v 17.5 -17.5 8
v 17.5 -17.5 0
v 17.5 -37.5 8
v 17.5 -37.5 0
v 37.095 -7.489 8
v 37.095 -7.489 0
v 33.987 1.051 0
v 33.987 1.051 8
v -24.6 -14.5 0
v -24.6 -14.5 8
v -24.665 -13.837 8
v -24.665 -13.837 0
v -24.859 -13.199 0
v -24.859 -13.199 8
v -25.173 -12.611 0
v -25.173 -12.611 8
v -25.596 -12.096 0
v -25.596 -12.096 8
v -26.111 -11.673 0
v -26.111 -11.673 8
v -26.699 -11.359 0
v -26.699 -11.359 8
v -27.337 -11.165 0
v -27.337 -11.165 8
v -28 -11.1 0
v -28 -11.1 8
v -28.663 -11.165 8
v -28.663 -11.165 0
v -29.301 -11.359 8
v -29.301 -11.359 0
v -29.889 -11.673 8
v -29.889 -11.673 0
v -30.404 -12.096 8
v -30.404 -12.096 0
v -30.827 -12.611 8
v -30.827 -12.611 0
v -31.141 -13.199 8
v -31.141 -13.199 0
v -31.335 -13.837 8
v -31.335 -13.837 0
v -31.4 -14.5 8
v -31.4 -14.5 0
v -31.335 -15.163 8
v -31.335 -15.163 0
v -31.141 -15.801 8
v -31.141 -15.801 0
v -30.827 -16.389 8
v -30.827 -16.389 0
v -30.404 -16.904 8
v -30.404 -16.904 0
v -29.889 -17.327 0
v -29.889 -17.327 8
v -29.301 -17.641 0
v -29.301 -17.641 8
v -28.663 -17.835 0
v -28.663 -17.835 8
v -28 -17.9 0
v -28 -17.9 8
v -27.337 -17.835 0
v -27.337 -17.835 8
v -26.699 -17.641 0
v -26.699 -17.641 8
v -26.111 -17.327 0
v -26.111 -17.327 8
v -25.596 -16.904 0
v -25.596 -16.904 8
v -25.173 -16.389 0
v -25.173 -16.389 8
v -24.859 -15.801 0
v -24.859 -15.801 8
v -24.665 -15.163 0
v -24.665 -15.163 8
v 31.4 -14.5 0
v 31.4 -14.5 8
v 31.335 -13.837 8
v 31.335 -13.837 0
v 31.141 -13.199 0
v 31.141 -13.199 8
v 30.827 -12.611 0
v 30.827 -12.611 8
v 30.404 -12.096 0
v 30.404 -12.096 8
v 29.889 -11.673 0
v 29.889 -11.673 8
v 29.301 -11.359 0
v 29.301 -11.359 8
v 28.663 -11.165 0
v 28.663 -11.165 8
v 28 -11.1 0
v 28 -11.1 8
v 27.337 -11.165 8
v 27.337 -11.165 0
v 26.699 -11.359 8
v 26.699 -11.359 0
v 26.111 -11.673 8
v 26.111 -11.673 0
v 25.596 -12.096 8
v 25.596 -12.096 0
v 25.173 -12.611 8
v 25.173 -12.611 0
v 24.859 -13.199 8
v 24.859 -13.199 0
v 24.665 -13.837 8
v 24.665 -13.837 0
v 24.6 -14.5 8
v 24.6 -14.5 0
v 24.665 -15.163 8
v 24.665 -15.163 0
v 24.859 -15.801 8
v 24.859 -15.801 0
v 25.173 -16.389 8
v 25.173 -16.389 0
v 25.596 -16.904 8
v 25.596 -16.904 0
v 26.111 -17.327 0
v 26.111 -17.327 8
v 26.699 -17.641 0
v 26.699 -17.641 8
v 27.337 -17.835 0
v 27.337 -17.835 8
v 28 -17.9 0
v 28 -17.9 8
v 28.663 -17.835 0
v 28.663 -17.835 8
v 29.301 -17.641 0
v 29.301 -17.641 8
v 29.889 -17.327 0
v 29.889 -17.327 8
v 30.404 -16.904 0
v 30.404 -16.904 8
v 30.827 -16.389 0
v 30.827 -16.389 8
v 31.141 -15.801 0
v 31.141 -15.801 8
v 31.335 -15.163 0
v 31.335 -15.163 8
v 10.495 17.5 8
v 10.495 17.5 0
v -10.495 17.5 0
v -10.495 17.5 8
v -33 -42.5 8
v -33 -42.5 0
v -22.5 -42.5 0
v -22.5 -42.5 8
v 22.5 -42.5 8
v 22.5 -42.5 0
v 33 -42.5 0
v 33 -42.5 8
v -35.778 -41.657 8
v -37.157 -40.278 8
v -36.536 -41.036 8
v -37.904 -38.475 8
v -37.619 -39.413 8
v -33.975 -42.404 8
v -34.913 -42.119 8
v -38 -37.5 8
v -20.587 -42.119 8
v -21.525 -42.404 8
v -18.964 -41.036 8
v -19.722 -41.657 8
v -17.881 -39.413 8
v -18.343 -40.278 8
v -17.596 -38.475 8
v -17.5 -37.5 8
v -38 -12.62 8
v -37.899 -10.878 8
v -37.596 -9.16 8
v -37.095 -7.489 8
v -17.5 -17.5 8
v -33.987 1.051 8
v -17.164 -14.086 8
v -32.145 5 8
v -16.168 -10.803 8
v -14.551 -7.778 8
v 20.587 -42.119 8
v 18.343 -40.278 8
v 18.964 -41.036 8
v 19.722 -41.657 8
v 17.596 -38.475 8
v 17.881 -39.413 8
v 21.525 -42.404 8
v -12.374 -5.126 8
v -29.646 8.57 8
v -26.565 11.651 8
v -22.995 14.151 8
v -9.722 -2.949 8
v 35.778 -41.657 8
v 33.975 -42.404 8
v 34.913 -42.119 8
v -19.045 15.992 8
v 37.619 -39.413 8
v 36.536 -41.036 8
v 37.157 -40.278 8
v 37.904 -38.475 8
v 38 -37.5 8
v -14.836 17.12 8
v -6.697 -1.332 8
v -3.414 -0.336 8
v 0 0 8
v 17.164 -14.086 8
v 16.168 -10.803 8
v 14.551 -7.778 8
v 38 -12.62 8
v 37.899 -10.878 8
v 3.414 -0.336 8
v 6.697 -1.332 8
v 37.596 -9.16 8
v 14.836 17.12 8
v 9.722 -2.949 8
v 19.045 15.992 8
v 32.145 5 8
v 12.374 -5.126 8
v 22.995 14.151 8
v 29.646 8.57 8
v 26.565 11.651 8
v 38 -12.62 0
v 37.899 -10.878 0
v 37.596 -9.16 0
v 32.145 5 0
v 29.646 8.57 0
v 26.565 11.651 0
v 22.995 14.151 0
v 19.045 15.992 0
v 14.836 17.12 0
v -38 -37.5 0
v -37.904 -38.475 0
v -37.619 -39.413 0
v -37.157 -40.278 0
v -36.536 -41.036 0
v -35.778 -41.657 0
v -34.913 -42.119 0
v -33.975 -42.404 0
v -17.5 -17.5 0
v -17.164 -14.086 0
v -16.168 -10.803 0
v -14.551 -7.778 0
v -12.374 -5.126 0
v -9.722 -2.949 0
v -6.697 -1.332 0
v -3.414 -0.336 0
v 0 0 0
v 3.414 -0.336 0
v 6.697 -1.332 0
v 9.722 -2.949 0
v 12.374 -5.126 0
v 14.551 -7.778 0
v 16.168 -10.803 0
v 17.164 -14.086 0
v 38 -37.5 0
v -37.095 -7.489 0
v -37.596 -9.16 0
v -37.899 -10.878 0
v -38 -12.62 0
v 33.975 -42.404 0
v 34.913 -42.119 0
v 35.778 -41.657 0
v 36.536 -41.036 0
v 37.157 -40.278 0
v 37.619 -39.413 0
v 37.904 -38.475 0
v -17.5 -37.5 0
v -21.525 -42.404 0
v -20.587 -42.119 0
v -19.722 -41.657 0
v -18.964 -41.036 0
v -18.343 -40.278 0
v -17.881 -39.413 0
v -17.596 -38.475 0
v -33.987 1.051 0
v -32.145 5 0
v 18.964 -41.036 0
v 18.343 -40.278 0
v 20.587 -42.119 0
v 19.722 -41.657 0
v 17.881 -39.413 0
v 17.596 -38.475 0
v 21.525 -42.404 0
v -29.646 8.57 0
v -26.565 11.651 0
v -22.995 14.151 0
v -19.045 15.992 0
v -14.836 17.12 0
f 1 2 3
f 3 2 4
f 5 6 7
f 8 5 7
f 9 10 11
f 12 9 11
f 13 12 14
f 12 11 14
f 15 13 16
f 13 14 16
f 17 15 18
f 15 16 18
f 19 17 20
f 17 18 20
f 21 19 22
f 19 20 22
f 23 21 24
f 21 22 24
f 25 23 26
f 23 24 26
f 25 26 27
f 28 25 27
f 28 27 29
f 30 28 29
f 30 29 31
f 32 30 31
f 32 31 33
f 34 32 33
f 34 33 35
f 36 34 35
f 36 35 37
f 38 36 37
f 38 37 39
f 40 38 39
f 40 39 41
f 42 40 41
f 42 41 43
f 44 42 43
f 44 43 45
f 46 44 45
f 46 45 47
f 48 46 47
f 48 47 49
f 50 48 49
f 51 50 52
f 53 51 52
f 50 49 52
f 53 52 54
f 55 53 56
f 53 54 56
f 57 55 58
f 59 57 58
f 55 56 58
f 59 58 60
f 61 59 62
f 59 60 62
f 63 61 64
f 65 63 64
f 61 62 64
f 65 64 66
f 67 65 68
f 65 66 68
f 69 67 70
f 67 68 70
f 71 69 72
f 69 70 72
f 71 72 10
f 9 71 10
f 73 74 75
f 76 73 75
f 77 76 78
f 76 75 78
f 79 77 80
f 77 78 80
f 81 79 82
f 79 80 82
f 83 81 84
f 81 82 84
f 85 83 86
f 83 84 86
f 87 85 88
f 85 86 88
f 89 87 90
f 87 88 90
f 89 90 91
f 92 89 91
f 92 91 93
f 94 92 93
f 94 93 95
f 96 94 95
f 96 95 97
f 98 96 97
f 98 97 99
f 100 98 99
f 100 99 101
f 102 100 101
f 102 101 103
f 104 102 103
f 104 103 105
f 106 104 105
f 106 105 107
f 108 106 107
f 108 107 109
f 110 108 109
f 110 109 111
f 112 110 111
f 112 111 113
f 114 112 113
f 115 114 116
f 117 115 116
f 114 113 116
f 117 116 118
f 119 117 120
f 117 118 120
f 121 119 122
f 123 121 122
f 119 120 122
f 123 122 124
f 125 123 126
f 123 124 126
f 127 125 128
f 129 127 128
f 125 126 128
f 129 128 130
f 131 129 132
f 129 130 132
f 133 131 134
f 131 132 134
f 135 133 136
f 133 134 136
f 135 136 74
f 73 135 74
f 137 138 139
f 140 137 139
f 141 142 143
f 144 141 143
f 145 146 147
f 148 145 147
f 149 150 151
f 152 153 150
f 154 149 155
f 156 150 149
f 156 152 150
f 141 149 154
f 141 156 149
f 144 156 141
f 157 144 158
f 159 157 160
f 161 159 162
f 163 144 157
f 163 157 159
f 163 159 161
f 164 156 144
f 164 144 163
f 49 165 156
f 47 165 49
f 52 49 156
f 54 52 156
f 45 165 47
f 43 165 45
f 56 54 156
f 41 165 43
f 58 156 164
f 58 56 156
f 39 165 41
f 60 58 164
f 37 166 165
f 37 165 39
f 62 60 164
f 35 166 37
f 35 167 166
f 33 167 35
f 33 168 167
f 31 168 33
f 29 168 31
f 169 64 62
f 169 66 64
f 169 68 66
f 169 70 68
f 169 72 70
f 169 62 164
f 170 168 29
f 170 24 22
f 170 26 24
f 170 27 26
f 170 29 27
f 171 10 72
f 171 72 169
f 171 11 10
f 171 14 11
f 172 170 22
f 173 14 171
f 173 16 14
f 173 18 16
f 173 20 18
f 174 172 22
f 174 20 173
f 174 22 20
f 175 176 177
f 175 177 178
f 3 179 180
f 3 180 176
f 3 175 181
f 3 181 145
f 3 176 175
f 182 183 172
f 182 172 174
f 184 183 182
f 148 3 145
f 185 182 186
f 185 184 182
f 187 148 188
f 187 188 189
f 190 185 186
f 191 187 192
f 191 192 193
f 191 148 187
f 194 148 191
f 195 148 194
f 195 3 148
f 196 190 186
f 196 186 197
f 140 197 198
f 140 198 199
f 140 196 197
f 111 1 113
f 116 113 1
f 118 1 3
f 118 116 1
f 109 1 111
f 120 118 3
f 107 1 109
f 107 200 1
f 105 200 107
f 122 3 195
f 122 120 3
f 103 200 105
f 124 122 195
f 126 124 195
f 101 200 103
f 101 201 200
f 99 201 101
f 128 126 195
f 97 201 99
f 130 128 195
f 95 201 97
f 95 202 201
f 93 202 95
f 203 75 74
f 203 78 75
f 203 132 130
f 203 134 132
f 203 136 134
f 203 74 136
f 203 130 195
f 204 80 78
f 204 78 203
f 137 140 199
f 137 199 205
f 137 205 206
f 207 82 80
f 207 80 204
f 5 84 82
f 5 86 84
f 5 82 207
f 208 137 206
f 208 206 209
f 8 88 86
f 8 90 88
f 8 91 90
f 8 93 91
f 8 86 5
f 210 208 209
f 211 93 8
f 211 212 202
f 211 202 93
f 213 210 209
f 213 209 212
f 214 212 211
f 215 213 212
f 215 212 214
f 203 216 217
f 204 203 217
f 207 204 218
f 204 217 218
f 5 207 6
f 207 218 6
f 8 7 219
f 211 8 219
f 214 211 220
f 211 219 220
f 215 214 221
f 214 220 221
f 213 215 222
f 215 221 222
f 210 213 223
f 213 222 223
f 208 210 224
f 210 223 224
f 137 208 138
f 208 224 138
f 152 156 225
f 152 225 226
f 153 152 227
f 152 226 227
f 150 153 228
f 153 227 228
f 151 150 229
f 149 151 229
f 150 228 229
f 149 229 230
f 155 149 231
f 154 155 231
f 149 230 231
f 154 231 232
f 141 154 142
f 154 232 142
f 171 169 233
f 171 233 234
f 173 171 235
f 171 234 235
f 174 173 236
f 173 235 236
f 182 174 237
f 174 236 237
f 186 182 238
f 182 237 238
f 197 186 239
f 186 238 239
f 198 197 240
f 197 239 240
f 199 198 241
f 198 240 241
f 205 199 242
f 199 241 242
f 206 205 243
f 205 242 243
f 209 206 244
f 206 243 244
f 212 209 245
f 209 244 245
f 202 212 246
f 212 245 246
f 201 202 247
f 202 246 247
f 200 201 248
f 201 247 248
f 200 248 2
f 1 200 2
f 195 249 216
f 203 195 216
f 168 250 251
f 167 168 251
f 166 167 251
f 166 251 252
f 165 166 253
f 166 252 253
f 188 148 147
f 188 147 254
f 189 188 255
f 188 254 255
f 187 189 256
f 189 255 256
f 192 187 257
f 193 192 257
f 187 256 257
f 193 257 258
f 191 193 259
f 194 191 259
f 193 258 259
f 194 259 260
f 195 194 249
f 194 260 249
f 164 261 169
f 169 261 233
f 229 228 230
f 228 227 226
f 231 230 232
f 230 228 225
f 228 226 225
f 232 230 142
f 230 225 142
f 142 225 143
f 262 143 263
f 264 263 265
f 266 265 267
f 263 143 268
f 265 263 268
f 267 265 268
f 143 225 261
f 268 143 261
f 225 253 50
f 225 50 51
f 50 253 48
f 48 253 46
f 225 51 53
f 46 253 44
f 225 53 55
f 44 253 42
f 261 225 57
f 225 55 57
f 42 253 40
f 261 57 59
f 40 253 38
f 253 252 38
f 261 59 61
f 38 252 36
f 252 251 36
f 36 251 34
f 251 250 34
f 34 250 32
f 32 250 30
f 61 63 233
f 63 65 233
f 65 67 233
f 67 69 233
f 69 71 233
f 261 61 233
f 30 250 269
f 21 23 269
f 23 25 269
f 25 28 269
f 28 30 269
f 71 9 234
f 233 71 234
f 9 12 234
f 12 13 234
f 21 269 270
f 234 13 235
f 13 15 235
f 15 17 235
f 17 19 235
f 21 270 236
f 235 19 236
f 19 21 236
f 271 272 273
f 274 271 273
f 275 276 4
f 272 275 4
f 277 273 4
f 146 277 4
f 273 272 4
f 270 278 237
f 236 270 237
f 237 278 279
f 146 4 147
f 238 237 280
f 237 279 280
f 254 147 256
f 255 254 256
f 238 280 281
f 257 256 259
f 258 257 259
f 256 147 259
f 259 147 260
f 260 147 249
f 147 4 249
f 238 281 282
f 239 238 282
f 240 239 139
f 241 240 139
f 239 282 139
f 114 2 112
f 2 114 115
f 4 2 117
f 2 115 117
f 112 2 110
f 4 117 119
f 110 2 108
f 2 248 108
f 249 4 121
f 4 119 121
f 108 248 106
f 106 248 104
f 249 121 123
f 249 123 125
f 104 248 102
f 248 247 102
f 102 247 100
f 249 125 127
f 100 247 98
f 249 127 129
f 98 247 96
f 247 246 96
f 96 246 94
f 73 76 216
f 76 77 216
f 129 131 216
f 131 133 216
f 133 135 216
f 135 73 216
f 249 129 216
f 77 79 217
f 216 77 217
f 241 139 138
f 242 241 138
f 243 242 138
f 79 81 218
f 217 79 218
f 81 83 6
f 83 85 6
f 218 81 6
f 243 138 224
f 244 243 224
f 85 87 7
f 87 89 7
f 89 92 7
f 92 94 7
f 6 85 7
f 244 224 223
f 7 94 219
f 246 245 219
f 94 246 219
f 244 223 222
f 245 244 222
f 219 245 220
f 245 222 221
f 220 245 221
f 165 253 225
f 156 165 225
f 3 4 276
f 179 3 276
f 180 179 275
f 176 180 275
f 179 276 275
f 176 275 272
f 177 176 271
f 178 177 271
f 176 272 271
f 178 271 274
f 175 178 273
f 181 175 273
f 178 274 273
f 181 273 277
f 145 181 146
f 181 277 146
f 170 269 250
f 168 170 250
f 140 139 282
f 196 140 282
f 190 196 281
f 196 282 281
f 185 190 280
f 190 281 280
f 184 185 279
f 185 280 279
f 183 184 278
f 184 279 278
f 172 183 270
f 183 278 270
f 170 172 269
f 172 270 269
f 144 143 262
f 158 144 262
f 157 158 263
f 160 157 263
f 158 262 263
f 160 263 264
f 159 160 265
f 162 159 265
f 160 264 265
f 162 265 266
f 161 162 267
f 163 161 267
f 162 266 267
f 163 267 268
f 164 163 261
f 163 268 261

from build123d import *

# Parameters (mm, degrees)
BASE_EXTRUDE_DEPTH    = 8
SKETCH4_R             = 3.4
M8_GEVINDHULLER_DEPTH = 10


with BuildPart() as part:
    # Sketch1 → Base-Extrude (new body)
    with BuildSketch(Plane.XY):
        with BuildLine():
            Line((17.5, -17.5), (17.5, -37.5))
            ThreePointArc((17.5, -37.5), (18.964466094, -41.035533906), (22.5, -42.5))
            Line((22.5, -42.5), (33, -42.5))
            ThreePointArc((33, -42.5), (36.535533906, -41.035533906), (38, -37.5))
            Line((38, -37.5), (38, -12.619678905))
            ThreePointArc((38, -12.619678905), (37.772116295, -10.01495624), (37.095389312, -7.489376755))
            Line((37.095389312, -7.489376755), (33.987127064, 1.050503583))
            ThreePointArc((33.987127064, 1.050503583), (24.834222454, 12.978801107), (10.494811545, 17.5))
            Line((10.494811545, 17.5), (-10.494811545, 17.5))
            ThreePointArc((-10.494811545, 17.5), (-24.834222454, 12.978801107), (-33.987127064, 1.050503583))
            Line((-33.987127064, 1.050503583), (-37.095389312, -7.489376755))
            ThreePointArc((-37.095389312, -7.489376755), (-37.772116295, -10.01495624), (-38, -12.619678905))
            Line((-38, -12.619678905), (-38, -37.5))
            ThreePointArc((-38, -37.5), (-36.535533906, -41.035533906), (-33, -42.5))
            Line((-33, -42.5), (-22.5, -42.5))
            ThreePointArc((-22.5, -42.5), (-18.964466094, -41.035533906), (-17.5, -37.5))
            Line((-17.5, -37.5), (-17.5, -17.5))
            ThreePointArc((-17.5, -17.5), (0, 0), (17.5, -17.5))
        make_face()
    extrude(amount=BASE_EXTRUDE_DEPTH)

    # Sketch4 → M8 gevindhuller (cut)
    with BuildSketch(Plane.XY.offset(8)):
        with Locations((-28, -14.5)):
            Circle(SKETCH4_R)
        with Locations((28, -14.5)):
            Circle(SKETCH4_R)
    extrude(amount=-M8_GEVINDHULLER_DEPTH, mode=Mode.SUBTRACT)


solid = part.part
